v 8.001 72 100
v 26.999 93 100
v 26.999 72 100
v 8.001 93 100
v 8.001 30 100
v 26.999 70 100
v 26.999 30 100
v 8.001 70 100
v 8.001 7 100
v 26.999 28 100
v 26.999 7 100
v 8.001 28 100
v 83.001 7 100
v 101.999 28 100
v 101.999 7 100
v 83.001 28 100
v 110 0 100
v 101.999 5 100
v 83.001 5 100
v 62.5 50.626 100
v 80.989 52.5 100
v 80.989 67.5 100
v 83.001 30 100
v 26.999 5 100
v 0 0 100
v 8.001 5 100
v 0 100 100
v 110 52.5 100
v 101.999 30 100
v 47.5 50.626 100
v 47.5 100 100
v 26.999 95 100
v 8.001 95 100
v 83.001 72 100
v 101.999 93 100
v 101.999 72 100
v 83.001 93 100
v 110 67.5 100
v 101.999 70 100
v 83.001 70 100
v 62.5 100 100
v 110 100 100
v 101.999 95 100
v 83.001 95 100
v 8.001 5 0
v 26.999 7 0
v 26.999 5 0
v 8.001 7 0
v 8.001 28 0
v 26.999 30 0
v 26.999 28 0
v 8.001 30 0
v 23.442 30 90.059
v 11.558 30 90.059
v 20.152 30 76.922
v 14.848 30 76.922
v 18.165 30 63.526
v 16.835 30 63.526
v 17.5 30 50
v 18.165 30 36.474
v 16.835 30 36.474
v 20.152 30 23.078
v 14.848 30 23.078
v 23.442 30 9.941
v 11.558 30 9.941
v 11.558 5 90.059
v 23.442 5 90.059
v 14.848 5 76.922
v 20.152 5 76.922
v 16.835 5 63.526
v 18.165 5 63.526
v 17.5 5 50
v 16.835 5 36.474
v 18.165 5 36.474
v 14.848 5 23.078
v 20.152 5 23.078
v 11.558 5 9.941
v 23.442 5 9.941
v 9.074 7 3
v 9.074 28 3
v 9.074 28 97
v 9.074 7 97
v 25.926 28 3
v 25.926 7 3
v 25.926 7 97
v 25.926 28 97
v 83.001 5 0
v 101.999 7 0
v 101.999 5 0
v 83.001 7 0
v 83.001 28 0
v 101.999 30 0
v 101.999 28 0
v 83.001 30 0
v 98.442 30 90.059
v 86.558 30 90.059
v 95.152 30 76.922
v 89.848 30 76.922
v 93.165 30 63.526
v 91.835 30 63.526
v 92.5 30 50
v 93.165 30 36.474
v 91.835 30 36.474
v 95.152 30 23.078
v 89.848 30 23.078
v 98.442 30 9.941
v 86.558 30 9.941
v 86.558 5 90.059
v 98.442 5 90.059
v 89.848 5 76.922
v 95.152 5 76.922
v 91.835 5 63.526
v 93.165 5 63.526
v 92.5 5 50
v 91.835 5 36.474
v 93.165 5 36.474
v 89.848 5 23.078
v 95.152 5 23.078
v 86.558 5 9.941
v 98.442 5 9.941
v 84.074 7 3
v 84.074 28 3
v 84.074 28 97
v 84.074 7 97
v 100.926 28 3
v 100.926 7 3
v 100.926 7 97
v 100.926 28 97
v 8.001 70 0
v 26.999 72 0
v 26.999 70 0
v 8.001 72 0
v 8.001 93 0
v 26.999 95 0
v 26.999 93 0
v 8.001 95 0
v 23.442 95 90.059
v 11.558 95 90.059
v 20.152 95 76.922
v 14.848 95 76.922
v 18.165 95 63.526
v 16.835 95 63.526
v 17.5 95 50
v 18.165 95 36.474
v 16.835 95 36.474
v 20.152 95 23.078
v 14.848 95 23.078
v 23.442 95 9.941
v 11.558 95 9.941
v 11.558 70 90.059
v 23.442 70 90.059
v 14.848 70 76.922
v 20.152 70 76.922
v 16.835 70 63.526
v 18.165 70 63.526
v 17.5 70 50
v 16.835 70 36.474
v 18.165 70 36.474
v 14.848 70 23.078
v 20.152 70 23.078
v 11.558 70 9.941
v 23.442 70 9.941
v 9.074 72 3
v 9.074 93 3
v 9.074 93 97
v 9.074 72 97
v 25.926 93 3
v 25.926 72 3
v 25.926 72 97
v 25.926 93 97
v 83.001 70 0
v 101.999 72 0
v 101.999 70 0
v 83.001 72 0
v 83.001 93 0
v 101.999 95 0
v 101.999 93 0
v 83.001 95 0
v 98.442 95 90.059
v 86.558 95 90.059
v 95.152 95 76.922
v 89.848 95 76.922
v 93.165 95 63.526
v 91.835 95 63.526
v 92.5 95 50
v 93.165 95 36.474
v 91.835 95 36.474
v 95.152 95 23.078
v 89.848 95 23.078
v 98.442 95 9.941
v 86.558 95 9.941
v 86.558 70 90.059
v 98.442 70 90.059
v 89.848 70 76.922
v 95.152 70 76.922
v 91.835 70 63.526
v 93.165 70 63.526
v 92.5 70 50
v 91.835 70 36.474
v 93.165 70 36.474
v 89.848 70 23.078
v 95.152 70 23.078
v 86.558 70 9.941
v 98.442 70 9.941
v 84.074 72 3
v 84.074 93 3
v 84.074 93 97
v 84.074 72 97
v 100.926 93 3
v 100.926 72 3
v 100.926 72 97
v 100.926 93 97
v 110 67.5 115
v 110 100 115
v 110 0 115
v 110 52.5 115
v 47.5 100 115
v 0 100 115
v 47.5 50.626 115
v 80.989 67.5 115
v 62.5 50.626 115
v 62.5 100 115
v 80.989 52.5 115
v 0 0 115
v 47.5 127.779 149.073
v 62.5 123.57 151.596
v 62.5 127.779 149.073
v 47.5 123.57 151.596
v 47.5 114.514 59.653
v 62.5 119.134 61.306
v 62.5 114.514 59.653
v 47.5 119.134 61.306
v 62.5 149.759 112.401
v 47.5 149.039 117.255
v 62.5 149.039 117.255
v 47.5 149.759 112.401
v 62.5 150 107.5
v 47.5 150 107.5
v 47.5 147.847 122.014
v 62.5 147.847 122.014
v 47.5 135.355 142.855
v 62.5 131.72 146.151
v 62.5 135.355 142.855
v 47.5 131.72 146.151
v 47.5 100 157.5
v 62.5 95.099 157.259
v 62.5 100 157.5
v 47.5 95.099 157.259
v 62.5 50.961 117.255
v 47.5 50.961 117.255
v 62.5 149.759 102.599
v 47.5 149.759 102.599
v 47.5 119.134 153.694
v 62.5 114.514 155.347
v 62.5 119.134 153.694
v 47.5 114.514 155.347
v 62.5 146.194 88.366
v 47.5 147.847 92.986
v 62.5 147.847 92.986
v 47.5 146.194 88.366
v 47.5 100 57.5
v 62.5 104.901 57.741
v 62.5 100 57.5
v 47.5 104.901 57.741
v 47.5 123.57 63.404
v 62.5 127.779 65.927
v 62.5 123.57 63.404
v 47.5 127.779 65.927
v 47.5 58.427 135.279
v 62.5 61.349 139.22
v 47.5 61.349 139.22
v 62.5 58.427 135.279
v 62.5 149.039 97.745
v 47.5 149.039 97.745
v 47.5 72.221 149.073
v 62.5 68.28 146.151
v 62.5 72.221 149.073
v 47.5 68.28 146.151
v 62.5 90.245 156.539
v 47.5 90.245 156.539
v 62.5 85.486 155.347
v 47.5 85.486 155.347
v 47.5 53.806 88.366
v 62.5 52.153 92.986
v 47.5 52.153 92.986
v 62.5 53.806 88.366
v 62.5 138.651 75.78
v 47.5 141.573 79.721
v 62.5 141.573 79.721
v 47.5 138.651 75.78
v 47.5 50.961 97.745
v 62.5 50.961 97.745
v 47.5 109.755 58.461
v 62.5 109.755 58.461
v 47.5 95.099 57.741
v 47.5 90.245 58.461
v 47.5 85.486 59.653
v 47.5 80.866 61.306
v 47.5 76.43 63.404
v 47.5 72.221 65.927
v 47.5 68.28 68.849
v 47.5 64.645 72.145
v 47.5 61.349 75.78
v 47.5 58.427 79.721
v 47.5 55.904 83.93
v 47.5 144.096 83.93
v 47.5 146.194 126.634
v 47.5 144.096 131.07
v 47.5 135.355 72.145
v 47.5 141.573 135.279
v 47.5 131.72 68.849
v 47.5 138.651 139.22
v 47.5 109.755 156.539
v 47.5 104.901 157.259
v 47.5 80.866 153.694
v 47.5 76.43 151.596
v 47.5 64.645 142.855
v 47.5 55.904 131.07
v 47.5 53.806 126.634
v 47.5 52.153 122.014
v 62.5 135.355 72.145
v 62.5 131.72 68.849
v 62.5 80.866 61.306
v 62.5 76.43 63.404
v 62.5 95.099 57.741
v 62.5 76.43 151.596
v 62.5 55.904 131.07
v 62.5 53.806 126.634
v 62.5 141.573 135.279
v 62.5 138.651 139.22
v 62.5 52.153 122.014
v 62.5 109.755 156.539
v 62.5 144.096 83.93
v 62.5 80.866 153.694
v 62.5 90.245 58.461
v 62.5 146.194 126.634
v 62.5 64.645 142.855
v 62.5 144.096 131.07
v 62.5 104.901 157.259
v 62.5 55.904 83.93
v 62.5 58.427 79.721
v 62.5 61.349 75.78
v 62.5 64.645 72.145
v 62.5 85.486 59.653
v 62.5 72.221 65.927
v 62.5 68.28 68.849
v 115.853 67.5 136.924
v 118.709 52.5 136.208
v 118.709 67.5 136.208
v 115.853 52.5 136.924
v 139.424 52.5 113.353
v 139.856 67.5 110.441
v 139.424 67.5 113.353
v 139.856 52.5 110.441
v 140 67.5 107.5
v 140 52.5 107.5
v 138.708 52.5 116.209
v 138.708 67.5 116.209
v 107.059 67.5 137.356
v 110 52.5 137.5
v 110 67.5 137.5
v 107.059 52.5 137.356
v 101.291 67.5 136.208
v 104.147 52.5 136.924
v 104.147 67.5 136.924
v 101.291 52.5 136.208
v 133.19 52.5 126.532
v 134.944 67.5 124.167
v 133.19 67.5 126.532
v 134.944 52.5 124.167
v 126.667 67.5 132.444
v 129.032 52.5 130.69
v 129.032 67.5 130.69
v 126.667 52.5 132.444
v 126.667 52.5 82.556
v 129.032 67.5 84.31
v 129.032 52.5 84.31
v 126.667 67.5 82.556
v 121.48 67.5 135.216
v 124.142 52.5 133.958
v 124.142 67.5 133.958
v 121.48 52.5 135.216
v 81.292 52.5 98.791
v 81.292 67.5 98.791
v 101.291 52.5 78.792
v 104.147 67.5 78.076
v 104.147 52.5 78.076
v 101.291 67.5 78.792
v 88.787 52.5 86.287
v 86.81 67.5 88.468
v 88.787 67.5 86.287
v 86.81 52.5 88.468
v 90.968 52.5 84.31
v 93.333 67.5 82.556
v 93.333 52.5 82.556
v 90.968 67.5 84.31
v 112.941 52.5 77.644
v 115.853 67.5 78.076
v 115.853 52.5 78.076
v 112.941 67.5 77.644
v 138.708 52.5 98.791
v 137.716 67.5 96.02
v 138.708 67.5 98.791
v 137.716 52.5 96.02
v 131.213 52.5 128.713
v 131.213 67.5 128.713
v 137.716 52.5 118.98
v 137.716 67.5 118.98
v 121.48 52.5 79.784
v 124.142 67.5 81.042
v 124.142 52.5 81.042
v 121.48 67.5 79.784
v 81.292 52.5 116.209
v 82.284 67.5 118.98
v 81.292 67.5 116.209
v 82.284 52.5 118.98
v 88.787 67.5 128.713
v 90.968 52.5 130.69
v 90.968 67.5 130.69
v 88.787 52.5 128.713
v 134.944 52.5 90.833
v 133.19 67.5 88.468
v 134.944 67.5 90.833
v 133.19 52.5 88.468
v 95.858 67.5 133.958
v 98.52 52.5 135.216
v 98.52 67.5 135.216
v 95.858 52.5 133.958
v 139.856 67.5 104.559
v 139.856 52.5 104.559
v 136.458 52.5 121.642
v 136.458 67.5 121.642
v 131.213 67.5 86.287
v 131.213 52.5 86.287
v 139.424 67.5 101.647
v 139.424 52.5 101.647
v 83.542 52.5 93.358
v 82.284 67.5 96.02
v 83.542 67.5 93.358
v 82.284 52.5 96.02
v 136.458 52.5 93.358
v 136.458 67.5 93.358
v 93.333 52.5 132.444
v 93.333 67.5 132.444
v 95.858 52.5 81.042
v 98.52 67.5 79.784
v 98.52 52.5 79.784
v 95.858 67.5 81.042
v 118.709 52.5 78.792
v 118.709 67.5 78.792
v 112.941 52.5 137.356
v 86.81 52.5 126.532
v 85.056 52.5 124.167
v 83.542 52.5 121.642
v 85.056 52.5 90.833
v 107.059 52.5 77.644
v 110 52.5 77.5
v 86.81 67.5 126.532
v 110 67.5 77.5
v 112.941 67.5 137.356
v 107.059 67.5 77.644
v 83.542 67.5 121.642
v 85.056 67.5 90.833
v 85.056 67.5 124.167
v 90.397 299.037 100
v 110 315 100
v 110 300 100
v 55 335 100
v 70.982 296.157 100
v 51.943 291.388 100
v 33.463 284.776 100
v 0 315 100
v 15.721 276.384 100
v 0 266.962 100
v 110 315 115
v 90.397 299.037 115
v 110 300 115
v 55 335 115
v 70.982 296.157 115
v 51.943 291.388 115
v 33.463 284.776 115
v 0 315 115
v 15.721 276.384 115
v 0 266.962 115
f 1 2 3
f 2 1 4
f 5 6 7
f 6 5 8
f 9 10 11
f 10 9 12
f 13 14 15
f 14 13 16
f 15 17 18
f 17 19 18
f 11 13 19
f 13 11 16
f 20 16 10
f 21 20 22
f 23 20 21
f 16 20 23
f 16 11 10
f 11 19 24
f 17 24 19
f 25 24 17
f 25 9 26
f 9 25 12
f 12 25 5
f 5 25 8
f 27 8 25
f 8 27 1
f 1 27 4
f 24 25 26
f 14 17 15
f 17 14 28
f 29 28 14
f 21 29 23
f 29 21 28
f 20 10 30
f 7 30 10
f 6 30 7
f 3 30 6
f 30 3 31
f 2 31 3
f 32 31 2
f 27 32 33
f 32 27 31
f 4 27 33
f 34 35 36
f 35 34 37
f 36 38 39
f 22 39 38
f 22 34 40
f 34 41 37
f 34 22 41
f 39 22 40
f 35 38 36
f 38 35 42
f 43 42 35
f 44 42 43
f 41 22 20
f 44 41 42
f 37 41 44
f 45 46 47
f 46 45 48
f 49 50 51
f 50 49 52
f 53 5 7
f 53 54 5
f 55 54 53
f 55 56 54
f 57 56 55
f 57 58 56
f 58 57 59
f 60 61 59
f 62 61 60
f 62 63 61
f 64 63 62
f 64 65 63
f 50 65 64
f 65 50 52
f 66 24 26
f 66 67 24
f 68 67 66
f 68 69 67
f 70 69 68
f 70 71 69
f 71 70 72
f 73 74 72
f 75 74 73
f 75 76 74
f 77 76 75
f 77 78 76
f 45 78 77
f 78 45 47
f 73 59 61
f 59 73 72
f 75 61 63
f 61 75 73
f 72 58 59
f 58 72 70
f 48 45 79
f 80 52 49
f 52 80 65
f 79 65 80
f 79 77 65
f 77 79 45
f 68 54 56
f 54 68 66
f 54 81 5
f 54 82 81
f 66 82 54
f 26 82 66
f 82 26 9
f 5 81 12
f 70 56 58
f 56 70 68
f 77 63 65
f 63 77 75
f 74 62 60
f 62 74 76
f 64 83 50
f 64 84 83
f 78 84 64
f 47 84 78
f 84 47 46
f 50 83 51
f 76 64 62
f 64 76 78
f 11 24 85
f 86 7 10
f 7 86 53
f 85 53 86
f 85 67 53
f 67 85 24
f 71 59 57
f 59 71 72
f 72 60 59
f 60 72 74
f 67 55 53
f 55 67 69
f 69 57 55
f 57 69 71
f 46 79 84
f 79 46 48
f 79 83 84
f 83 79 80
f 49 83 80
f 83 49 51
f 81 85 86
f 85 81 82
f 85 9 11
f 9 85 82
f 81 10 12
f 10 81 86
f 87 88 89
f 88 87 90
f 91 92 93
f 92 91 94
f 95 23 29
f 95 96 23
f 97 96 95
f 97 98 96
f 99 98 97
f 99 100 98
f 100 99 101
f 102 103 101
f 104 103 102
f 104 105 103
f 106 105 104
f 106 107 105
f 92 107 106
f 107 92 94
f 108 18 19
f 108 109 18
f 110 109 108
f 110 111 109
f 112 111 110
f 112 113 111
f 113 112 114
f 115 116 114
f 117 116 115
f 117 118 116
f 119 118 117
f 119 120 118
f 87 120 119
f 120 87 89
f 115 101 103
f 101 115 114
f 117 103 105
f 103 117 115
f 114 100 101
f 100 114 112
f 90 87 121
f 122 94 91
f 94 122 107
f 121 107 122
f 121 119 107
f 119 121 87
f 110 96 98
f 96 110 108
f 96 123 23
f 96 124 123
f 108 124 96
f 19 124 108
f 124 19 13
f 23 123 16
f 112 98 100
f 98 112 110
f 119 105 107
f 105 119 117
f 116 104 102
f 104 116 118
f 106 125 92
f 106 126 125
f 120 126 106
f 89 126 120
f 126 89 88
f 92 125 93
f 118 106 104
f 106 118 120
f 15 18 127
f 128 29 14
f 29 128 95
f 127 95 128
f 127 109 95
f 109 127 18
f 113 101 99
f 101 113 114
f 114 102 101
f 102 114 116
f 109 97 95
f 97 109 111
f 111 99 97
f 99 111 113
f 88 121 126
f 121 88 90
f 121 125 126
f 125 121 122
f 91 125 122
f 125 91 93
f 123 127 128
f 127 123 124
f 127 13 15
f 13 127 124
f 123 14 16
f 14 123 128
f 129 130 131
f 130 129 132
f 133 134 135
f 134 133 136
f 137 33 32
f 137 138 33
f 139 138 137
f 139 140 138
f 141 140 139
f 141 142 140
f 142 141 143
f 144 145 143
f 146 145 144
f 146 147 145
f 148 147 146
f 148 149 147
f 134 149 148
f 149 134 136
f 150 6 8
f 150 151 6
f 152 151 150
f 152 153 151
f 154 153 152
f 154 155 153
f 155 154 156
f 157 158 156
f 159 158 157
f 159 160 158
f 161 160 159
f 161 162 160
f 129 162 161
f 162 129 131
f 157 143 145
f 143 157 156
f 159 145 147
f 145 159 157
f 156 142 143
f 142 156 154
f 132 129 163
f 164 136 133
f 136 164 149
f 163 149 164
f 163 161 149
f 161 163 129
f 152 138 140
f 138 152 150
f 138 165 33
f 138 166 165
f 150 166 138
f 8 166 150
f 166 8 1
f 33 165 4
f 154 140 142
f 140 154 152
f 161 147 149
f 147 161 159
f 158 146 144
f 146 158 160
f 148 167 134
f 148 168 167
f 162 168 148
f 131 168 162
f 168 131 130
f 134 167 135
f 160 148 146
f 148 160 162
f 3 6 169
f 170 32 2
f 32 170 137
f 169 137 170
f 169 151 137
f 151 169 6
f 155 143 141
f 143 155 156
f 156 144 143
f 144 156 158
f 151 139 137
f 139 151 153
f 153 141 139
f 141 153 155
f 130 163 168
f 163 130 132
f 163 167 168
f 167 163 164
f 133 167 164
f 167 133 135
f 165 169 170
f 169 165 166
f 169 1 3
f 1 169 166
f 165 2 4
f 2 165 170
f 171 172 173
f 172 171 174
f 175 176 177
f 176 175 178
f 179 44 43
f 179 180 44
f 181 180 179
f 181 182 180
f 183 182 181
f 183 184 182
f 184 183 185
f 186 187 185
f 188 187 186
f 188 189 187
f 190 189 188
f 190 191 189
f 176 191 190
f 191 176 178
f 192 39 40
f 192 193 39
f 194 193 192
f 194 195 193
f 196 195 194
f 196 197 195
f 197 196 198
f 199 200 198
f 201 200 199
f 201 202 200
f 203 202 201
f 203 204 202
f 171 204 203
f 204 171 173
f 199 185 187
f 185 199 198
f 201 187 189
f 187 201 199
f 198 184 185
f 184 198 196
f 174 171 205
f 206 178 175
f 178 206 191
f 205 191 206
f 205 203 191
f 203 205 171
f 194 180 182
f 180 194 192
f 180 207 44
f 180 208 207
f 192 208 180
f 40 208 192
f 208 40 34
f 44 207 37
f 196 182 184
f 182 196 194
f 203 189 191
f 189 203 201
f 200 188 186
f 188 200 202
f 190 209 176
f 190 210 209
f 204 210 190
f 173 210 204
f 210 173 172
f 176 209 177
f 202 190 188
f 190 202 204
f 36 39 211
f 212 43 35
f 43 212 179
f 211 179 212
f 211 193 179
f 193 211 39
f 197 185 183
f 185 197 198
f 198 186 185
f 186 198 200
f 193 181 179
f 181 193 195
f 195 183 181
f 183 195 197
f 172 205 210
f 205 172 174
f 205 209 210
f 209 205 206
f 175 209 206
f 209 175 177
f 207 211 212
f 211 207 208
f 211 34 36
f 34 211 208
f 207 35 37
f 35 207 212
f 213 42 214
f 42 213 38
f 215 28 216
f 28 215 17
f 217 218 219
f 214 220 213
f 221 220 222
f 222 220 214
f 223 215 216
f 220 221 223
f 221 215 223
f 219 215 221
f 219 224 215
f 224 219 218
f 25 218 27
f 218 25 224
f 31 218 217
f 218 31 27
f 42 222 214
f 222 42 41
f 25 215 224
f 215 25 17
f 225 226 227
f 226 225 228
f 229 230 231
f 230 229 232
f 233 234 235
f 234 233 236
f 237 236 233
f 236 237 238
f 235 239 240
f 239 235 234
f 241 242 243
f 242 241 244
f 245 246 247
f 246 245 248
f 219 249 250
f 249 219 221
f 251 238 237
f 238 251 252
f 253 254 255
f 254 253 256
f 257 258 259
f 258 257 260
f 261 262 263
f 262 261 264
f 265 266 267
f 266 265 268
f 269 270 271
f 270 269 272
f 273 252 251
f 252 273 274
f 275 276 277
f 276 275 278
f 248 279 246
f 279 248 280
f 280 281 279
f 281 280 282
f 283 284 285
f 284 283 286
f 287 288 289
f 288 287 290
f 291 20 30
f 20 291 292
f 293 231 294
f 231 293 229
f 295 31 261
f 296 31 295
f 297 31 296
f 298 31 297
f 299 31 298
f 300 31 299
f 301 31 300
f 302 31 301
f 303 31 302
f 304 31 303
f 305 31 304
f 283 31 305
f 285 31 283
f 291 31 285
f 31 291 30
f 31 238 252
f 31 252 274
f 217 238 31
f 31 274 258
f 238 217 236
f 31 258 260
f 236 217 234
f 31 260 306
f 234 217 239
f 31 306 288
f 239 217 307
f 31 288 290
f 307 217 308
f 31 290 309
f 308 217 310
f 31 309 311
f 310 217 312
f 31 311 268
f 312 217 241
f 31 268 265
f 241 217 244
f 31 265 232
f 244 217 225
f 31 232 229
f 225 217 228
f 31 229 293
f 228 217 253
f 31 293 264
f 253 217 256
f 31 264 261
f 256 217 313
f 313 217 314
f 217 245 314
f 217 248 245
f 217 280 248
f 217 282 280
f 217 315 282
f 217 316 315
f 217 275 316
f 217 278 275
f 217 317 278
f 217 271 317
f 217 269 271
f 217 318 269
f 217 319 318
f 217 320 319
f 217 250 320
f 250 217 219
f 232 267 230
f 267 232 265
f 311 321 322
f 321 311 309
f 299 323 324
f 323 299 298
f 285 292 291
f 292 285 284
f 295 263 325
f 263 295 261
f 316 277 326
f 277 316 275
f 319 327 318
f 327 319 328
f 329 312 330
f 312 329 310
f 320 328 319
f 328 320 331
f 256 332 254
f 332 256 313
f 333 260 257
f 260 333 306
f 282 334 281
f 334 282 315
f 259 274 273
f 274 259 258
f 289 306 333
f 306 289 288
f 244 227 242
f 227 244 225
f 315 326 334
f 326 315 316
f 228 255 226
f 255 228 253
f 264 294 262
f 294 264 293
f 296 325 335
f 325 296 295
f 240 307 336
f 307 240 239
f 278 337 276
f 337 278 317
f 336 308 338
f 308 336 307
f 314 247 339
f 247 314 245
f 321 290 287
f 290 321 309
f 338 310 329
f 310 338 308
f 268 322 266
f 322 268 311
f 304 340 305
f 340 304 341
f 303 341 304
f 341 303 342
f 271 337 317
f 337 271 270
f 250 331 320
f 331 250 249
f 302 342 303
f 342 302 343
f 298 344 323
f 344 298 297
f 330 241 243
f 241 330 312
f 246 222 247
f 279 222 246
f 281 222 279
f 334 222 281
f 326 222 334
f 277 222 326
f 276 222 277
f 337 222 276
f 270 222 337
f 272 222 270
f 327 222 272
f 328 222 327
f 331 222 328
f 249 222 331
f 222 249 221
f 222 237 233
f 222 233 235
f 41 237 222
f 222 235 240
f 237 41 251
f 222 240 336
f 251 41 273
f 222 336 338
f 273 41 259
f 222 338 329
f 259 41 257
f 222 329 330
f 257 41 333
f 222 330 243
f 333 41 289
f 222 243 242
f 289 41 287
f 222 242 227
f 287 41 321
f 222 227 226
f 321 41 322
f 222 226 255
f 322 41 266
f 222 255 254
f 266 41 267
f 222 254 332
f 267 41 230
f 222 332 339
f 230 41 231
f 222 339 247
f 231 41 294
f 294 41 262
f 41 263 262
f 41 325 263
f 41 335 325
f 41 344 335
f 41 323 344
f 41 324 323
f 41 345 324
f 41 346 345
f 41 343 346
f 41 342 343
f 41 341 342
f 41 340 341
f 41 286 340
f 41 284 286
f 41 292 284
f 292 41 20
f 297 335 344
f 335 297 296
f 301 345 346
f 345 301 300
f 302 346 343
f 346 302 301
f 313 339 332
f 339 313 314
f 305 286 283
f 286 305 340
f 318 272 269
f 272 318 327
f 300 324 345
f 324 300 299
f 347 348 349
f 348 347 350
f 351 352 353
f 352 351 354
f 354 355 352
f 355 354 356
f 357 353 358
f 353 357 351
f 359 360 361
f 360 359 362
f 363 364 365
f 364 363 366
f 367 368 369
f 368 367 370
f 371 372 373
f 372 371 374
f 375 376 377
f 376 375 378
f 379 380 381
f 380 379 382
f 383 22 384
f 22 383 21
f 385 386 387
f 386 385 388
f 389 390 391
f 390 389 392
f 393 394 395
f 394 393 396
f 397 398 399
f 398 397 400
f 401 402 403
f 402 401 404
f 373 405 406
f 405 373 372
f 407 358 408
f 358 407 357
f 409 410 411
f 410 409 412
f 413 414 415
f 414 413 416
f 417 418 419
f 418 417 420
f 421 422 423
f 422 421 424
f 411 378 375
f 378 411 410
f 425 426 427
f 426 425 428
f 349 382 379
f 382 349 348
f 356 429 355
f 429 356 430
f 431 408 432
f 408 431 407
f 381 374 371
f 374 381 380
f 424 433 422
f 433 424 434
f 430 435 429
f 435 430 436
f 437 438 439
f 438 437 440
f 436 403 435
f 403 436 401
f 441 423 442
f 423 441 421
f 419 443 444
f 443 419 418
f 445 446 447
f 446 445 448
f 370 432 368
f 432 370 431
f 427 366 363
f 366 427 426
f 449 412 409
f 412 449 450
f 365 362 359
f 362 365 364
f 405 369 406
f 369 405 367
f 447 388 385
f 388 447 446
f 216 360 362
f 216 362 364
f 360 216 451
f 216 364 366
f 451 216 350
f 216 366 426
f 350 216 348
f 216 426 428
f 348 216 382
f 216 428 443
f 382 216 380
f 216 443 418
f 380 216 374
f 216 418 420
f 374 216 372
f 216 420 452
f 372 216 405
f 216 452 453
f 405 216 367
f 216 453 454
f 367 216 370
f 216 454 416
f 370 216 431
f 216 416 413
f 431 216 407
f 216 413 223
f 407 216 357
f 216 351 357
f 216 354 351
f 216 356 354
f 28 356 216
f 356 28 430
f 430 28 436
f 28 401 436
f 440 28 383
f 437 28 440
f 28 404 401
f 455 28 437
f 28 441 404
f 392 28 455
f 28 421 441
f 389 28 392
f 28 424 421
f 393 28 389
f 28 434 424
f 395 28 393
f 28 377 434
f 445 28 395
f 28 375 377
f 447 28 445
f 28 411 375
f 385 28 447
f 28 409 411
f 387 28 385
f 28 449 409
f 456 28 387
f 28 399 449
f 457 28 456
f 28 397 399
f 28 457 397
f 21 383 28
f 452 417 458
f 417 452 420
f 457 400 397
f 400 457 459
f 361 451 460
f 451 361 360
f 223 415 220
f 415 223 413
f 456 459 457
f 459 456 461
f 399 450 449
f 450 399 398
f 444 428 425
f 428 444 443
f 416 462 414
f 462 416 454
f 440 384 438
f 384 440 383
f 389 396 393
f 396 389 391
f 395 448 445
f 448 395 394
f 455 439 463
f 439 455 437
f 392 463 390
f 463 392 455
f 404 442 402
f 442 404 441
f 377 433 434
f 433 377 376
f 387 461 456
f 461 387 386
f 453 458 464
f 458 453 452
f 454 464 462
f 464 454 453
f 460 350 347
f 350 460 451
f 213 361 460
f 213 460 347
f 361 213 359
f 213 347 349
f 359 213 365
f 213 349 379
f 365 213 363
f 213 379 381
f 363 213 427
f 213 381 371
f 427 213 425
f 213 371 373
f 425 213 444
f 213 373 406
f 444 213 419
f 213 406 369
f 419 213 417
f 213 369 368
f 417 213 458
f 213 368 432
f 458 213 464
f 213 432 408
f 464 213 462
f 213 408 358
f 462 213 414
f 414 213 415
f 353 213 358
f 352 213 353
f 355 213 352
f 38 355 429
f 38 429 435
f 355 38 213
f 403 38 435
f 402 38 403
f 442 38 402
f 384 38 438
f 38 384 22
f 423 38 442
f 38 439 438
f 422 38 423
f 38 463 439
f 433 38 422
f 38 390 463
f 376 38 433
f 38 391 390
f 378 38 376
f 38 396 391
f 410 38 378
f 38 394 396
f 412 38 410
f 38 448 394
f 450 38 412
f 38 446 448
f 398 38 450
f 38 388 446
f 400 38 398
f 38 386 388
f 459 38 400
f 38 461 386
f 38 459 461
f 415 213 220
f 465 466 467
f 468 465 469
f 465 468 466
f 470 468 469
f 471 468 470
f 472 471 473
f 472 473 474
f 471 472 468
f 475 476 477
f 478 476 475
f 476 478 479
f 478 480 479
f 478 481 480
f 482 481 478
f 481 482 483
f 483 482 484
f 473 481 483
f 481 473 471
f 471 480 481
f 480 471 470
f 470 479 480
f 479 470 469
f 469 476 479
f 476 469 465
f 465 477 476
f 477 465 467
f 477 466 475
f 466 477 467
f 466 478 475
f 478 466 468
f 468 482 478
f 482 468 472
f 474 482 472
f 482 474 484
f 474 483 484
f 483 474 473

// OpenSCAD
// Global Configuration
$fn = 64;
fillet_r = 2;
cutout_tilt_angle = 30;

// Core Dimensions
leg_size = 25;
leg_height = 100;
leg_concave_radius = 138;
seat_width = 110;
seat_depth = 100;
seat_thickness = 15;
backrest_height = 215;
backrest_thickness = 15;

// ------------------------------
// Module: Waisted Leg (column/column_spacer)
// ------------------------------
module waisted_leg() {
  difference() {
    // Base leg solid
    cube([leg_size, leg_size, leg_height], center=false);
    
    // Create concave waisted profile on 4 sides
    translate([leg_size/2, -leg_concave_radius + leg_size/2, leg_height/2])
      rotate([90, 0, 0])
      cylinder(h=leg_size + 2, r=leg_concave_radius, center=true);
    translate([leg_size/2, leg_concave_radius + leg_size/2, leg_height/2])
      rotate([90, 0, 0])
      cylinder(h=leg_size + 2, r=leg_concave_radius, center=true);
    translate([-leg_concave_radius + leg_size/2, leg_size/2, leg_height/2])
      rotate([90, 90, 0])
      cylinder(h=leg_size + 2, r=leg_concave_radius, center=true);
    translate([leg_concave_radius + leg_size/2, leg_size/2, leg_height/2])
      rotate([90, 90, 0])
      cylinder(h=leg_size + 2, r=leg_concave_radius, center=true);

    // Round vertical edges
    for (x = [0, leg_size], y = [0, leg_size]) {
      translate([x, y, 0])
        cylinder(h=leg_height, r=fillet_r, center=false);
    }

    // Top/bottom end chamfers
    translate([-1, -1, -1])
      linear_extrude(height=4)
      offset(r=-3)
      square([leg_size + 2, leg_size + 2], center=false);
    translate([-1, -1, leg_height - 3])
      linear_extrude(height=4)
      offset(r=-3)
      square([leg_size + 2, leg_size + 2], center=false);
  }
}

// ------------------------------
// Module: Decorative Bracket (seat + backrest)
// ------------------------------
module decorative_bracket() {
  union() {
    // Seat assembly
    union() {
      // Main seat platform
      cube([seat_width, seat_depth, seat_thickness], center=false);
      // Rounded front arc (R=50 per spec)
      translate([seat_width/2, seat_depth, seat_thickness/2])
        rotate([90, 0, 90])
        cylinder(h=seat_thickness, r=50, center=true);
      // Side curved detail (R=20 per spec)
      translate([seat_width, seat_depth - 40, seat_thickness/2])
        rotate([90, 0, 0])
        cylinder(h=seat_thickness, r=30, center=true);
    }

    // Backrest assembly
    translate([0, seat_depth, 0])
    difference() {
      // Base pointed leaf profile
      linear_extrude(height=backrest_thickness, center=false)
      difference() {
        polygon(points=[
          [0, 0],
          [seat_width, 0],
          [seat_width, backrest_height],
          [seat_width/2, backrest_height + 20],
          [0, backrest_height]
        ]);
        // Curved front edge contour
        translate([seat_width, 0])
          circle(r=backrest_height - 15);
      }

      // Central diamond cutout (tilted 30deg per spec)
      translate([seat_width/2, backrest_height/2, -1])
        rotate([0, 0, cutout_tilt_angle])
        linear_extrude(height=backrest_thickness + 2, center=true)
        square([18, 18], center=true);

      // Four surrounding curved cutouts
      for (angle = [0, 90, 180, 270]) {
        rotate(angle)
        translate([seat_width/2 + 15, backrest_height/2, -1])
          rotate([0, 0, 45])
          linear_extrude(height=backrest_thickness + 2)
          circle(r=7.5);
      }
    }

    // Seat top recessed cutouts
    for (pos = [[28, 30], [55, 58], [82, 30]]) {
      translate([pos[0], pos[1], seat_thickness - 2])
        rotate([0, 0, cutout_tilt_angle])
        linear_extrude(height=3, center=true)
        square([18, 18], center=true);
    }
  }
}

// ------------------------------
// Main Assembly
// ------------------------------
union() {
  // Place 4 legs at seat corners
  translate([5, 5, 0]) waisted_leg();
  translate([seat_width - leg_size - 5, 5, 0]) waisted_leg();
  translate([5, seat_depth - leg_size - 5, 0]) waisted_leg();
  translate([seat_width - leg_size - 5, seat_depth - leg_size - 5, 0]) waisted_leg();

  // Place seat + backrest on top of legs
  translate([0, 0, leg_height]) decorative_bracket();
}
